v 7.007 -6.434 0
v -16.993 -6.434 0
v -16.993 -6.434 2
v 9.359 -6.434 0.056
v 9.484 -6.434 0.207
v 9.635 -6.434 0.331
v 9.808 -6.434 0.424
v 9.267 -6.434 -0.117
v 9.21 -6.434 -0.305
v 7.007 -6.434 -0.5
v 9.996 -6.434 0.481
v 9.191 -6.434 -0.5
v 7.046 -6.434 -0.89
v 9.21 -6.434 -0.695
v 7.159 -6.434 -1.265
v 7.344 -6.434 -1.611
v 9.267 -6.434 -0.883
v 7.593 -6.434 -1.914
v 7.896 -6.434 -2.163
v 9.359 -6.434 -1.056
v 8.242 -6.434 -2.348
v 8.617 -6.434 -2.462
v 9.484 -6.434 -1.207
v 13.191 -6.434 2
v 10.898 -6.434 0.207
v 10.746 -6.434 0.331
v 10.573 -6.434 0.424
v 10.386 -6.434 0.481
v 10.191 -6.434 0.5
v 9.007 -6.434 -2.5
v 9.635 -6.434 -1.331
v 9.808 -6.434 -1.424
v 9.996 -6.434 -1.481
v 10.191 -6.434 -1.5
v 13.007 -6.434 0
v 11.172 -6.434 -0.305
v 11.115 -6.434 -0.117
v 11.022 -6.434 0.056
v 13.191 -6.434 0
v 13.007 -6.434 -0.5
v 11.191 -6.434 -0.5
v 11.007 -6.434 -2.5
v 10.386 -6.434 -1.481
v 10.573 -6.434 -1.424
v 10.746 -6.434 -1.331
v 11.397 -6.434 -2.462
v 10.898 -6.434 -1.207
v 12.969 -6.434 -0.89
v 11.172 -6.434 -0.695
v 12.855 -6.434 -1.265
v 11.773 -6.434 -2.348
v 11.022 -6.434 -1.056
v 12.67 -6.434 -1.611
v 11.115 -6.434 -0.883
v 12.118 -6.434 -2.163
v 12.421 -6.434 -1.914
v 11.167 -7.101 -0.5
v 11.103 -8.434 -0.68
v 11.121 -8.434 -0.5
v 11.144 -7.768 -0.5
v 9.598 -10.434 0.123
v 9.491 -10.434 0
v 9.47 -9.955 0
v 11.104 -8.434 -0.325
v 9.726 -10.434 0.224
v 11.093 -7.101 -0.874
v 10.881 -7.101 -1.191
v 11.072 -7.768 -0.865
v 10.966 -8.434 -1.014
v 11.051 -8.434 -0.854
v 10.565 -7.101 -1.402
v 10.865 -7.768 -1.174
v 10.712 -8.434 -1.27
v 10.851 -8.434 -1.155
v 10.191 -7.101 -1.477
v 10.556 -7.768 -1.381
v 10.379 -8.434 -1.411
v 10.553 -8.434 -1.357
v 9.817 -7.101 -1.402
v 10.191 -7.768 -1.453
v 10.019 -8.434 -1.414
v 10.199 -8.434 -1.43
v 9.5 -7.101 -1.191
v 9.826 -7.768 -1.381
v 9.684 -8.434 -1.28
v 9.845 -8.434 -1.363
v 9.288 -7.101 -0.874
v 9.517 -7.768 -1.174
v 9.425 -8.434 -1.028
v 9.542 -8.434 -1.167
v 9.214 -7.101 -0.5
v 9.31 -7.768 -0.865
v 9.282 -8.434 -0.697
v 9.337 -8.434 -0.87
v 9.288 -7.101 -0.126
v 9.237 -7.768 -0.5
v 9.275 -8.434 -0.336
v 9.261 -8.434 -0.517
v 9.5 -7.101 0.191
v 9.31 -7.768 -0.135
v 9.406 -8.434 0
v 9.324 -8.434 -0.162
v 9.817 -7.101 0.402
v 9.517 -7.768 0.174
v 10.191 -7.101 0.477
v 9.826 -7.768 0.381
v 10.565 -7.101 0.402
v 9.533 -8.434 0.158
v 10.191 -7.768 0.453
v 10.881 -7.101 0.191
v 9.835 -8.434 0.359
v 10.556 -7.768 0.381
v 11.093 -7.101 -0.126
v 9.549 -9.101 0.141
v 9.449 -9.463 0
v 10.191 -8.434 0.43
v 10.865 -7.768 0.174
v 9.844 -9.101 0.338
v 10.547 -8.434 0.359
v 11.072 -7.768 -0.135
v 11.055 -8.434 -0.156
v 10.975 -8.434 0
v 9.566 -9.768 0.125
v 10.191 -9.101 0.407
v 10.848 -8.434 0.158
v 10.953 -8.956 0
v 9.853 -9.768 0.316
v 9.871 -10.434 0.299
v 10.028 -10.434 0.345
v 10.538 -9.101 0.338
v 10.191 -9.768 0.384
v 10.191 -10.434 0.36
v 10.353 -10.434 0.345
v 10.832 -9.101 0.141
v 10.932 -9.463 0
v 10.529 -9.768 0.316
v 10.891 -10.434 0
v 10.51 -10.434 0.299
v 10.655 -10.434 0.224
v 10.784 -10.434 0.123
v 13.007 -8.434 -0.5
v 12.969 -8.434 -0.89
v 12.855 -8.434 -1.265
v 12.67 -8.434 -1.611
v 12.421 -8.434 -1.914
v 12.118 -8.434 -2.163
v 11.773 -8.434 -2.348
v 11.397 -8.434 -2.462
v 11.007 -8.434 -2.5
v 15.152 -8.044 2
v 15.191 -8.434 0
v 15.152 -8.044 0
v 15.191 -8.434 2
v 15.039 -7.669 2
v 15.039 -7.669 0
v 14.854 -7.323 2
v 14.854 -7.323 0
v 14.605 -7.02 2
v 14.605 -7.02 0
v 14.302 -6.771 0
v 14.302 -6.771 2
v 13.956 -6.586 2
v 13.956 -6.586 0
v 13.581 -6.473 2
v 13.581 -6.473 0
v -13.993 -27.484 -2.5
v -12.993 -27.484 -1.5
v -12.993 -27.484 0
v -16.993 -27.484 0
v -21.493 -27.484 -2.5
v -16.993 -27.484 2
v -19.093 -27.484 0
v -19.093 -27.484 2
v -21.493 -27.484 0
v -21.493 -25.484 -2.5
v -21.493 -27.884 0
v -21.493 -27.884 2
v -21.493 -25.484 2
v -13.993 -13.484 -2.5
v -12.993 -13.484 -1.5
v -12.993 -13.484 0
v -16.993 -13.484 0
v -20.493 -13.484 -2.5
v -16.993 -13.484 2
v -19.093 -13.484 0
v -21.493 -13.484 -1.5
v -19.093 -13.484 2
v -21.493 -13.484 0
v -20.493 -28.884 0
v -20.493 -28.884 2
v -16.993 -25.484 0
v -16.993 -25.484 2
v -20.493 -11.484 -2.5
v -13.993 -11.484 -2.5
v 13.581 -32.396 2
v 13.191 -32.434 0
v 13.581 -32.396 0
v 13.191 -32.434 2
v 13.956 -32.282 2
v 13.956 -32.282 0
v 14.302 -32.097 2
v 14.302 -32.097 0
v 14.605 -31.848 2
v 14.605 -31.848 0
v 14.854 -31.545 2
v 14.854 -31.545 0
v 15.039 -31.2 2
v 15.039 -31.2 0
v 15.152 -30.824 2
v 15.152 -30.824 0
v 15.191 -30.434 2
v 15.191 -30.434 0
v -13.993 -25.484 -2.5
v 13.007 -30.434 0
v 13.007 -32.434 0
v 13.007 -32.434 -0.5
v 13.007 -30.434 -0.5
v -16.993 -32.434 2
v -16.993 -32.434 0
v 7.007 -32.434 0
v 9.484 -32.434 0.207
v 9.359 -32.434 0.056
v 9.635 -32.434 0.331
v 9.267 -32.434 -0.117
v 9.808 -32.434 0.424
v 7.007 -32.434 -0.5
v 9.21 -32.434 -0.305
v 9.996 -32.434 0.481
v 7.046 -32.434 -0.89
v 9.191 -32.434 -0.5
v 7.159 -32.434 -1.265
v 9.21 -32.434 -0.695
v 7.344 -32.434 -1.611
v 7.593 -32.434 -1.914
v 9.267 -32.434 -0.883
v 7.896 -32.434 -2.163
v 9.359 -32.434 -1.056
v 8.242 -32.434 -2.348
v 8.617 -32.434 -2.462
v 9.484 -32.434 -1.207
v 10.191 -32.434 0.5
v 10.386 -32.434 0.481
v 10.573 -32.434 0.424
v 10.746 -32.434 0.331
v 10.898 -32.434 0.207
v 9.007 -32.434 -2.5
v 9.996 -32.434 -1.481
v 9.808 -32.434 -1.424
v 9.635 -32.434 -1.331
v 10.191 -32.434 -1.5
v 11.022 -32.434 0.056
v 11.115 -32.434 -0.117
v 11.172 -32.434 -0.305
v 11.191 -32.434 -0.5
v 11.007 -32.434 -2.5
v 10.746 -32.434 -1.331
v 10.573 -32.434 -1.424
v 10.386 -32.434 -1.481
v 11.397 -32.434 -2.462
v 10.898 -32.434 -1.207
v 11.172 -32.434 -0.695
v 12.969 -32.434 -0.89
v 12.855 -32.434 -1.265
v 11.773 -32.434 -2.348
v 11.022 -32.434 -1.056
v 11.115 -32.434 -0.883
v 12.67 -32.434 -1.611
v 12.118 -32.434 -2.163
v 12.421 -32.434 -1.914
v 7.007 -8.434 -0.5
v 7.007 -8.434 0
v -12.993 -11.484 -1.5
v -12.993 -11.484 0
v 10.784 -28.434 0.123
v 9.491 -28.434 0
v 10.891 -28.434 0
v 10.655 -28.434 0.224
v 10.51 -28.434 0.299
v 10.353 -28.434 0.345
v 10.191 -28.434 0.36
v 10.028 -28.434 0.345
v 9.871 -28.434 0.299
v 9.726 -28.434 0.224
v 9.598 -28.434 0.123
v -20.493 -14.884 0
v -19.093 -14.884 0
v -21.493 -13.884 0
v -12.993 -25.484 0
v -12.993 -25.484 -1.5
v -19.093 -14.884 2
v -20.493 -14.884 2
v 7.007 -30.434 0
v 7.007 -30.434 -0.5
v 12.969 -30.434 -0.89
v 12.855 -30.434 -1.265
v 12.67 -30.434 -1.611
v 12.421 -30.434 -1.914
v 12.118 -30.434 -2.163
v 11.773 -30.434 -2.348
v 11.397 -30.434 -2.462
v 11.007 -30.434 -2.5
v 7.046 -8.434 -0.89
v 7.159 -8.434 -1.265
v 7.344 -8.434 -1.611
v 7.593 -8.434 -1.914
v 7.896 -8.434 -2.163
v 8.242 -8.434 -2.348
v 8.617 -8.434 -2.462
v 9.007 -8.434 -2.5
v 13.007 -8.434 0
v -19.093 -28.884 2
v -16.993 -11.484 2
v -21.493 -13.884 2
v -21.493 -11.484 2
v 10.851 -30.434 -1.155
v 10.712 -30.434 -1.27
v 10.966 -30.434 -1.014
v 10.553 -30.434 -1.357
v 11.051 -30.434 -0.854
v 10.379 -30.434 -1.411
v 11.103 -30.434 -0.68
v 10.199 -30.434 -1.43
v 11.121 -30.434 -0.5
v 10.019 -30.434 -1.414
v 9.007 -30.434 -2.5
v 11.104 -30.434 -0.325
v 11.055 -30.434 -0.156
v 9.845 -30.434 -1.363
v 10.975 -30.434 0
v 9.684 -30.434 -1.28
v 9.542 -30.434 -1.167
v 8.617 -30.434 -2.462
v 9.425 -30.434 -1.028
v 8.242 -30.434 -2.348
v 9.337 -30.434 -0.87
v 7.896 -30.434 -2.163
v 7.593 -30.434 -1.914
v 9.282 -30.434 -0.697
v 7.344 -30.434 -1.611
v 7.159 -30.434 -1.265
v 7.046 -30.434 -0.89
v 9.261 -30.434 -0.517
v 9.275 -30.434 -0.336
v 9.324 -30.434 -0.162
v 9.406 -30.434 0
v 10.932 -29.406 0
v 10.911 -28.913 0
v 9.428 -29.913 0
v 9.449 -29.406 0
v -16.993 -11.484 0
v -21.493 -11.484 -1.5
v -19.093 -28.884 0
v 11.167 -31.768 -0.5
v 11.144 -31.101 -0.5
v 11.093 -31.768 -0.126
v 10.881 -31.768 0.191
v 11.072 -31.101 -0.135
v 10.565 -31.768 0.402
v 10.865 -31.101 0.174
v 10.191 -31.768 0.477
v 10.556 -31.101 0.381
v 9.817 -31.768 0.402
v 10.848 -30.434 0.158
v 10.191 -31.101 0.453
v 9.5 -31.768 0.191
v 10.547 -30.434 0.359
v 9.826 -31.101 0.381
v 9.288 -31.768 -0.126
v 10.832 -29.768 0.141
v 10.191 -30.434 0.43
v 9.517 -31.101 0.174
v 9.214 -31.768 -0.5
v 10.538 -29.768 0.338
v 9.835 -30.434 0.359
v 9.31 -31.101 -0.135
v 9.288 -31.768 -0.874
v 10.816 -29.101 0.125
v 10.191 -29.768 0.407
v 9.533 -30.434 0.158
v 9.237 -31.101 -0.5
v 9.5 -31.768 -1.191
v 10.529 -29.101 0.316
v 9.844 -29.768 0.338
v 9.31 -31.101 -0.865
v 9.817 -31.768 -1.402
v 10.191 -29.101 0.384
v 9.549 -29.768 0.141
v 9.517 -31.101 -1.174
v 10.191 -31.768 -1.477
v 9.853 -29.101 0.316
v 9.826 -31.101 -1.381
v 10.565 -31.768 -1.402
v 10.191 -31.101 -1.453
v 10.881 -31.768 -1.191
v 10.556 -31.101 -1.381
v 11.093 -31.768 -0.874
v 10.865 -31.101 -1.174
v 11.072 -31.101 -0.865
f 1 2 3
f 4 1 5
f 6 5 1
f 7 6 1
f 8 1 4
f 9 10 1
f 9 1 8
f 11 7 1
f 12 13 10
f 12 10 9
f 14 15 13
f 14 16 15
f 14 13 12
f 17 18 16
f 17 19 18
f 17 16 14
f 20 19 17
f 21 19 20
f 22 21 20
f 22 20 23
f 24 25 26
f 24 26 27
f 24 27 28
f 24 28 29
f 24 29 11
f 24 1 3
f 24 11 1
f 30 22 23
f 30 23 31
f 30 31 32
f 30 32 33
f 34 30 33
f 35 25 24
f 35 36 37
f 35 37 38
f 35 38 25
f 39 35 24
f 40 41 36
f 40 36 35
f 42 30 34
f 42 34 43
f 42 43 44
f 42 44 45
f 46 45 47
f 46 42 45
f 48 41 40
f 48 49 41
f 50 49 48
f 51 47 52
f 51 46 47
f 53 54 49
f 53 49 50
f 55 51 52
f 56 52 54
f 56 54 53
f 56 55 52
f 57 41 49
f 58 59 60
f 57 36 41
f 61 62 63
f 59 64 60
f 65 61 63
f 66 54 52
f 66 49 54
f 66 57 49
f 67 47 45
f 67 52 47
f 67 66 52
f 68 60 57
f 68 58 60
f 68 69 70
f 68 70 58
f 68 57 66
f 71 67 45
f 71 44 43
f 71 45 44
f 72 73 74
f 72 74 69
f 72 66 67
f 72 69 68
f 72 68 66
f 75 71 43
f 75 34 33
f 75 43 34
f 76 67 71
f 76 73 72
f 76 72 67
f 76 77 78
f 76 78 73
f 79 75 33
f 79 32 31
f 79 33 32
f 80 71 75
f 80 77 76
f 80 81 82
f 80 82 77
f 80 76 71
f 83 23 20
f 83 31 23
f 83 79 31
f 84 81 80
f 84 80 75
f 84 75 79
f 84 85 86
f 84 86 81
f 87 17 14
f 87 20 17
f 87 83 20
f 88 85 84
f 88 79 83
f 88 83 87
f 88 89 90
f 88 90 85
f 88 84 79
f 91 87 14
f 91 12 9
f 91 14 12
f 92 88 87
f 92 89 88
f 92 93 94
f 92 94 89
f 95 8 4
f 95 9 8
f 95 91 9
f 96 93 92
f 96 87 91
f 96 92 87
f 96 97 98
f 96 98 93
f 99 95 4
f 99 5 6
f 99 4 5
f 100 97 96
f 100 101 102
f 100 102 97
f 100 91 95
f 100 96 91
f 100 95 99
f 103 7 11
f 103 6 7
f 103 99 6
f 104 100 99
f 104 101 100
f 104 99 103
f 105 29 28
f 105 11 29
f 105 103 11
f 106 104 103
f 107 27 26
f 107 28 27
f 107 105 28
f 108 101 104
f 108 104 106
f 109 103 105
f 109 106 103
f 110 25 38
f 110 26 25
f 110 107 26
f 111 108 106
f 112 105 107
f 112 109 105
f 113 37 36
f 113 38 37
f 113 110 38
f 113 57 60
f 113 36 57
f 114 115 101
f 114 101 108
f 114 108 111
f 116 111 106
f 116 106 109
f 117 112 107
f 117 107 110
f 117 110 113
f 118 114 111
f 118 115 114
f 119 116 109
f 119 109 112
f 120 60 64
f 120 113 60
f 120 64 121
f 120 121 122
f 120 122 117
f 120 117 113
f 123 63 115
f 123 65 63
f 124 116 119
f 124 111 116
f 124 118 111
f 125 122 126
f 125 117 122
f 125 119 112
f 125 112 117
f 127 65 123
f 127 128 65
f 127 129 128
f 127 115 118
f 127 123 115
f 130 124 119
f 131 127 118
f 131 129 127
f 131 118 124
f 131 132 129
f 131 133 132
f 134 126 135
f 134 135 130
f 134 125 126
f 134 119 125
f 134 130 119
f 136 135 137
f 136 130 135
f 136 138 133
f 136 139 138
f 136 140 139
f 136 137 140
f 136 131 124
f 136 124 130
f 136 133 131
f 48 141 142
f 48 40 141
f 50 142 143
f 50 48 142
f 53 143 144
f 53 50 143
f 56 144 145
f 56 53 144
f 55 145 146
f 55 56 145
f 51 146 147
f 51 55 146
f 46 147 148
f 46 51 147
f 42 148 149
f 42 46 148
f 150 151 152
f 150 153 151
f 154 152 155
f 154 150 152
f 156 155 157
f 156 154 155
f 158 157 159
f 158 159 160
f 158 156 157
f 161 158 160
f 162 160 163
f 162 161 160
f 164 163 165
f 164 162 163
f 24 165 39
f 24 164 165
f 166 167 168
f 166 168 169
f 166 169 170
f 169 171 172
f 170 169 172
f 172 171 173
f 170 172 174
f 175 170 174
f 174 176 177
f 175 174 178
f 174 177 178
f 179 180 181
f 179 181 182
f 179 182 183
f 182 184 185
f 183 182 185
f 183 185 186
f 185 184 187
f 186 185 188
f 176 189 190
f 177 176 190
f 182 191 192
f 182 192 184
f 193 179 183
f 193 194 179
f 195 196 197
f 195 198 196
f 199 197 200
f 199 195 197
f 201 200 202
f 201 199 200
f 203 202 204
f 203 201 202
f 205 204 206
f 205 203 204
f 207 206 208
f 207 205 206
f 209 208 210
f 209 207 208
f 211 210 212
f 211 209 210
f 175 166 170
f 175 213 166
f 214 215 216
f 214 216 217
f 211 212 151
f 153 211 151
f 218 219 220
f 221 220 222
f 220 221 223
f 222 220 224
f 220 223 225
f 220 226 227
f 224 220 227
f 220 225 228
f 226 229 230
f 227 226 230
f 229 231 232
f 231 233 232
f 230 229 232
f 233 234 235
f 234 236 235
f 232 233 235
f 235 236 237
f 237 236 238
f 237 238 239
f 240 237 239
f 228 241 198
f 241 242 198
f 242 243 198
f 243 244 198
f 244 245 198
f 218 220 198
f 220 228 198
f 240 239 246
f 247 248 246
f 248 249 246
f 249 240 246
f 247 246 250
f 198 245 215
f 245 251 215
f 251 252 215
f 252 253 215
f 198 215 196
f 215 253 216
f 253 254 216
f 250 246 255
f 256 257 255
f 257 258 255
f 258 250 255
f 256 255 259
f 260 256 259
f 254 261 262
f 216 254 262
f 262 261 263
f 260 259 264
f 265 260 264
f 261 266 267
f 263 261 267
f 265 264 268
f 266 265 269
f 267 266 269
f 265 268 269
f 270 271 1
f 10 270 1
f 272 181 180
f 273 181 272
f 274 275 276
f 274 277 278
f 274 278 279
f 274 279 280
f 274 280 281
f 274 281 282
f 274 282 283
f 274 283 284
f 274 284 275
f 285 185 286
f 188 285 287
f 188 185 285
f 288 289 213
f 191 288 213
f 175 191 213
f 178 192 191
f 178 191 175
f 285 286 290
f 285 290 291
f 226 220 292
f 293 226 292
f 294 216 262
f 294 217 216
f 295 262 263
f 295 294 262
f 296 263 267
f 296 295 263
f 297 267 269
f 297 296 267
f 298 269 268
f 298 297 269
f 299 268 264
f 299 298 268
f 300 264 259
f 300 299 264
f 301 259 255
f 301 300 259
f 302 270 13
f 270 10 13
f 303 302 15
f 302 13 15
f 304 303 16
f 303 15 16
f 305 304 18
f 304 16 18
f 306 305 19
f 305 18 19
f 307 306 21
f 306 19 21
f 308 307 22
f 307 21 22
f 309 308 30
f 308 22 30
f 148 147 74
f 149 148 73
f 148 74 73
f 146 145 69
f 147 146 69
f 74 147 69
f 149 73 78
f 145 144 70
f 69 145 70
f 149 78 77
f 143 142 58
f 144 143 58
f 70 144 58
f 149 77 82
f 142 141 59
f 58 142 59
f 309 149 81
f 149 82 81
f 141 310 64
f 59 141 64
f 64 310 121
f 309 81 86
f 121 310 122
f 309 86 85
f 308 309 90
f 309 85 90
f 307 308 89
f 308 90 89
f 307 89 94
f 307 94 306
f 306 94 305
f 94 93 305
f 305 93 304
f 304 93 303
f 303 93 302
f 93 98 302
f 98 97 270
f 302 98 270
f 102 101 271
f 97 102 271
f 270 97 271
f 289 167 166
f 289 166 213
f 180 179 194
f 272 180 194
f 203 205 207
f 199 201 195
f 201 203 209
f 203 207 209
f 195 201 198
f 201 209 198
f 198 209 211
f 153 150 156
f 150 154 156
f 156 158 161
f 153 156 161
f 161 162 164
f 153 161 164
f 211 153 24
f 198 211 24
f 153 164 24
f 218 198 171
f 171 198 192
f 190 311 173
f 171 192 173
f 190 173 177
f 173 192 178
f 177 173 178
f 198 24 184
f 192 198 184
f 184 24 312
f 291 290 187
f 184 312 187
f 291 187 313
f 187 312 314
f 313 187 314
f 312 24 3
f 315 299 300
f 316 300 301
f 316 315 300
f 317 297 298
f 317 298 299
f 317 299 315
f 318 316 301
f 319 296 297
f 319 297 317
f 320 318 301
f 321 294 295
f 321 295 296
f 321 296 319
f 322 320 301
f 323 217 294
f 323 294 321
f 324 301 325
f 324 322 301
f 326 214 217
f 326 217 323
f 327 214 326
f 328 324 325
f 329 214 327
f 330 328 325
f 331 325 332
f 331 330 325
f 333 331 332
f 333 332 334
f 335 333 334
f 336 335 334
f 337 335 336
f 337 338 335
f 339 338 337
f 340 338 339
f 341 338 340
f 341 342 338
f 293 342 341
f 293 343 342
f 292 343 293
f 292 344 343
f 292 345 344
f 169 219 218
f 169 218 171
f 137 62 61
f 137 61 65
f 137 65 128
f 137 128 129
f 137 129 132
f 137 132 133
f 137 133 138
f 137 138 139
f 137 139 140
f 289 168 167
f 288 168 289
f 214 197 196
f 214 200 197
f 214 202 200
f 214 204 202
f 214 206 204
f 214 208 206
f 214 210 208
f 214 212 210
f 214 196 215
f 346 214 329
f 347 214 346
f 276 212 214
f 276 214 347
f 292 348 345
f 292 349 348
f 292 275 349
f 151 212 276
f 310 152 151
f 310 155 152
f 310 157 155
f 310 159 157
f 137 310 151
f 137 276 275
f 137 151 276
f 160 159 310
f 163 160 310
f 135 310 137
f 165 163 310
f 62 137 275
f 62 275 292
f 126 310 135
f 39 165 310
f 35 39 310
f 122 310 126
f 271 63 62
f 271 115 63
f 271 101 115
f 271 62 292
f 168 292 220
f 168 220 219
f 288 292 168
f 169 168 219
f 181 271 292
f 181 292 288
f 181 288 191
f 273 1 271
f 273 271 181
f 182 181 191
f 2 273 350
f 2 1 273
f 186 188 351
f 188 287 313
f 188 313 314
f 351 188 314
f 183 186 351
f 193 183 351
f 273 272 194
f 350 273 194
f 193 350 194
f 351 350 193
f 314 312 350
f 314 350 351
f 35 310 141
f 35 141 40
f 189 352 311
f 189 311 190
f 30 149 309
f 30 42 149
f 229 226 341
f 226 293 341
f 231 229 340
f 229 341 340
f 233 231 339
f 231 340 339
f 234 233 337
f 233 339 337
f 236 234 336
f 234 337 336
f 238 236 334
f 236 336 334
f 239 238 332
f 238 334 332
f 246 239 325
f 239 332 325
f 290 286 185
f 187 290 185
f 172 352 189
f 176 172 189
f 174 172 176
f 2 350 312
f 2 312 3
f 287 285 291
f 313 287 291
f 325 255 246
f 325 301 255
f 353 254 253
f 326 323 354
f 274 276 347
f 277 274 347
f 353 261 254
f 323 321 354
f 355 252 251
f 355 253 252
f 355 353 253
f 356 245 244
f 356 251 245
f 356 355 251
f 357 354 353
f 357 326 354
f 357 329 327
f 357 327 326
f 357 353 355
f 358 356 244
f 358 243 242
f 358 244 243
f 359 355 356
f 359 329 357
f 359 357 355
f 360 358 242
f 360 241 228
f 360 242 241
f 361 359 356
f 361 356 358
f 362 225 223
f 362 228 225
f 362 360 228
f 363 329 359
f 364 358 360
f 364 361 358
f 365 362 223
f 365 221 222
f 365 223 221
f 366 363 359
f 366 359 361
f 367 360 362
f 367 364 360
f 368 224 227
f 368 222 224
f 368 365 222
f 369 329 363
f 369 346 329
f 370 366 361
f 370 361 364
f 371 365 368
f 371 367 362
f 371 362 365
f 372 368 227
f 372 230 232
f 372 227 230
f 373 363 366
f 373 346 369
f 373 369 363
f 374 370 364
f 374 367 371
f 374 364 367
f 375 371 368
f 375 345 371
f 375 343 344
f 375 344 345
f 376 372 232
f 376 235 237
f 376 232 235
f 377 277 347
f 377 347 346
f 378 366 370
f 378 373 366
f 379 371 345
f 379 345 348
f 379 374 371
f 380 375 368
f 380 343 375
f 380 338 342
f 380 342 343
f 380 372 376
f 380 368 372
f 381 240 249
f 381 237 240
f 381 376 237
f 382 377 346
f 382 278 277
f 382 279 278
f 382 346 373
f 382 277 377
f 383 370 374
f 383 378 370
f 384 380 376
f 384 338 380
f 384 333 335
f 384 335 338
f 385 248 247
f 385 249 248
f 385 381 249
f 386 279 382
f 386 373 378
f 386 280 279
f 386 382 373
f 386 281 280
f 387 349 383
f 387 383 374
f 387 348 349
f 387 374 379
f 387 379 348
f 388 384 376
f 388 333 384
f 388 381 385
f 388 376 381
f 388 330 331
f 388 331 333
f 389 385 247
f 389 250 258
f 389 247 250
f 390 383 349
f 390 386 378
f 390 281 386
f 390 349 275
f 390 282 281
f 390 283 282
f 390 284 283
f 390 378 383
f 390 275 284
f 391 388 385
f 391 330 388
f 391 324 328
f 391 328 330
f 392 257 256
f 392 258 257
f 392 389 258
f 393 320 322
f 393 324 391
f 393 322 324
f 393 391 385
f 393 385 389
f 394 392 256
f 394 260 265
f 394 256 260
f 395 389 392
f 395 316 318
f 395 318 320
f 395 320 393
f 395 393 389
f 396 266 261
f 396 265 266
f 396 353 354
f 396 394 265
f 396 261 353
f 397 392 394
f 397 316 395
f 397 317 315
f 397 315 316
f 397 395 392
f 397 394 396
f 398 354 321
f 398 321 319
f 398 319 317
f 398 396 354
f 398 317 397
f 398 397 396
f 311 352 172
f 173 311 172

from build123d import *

# Parameters (mm, degrees)
SKETCH_2_W          = 32.183544672
SKETCH_2_H          = 26
EXTRUDE_1_DEPTH     = 2
FILLET_1_R          = 2
SKETCH_5_W          = 6
SKETCH_5_H          = 2
EXTRUDE_2_DEPTH     = 2.5
FILLET_2_R          = 2
SKETCH_6_R          = 1
CUT_EXTRUDE_3_DEPTH = 4
CUT_EXTRUDE_3_TAPER = 2
SKETCH_7_R          = 1
CUT_EXTRUDE_4_DEPTH = 4
CUT_EXTRUDE_4_TAPER = 2
SKETCH_9_W          = 4.5
SKETCH_9_H          = 2
EXTRUDE_3_DEPTH     = 2
SKETCH_10_W         = 2.4
SKETCH_10_H         = 1.4
EXTRUDE_4_DEPTH     = 2
CHAMFER_1_SIZE      = 1
SKETCH_11_W         = 8.5
SKETCH_11_H         = 2
EXTRUDE_5_DEPTH     = 2.5
CHAMFER_2_SIZE      = 1


with BuildPart() as part:
    # 草图2 → 凸台-拉伸1 (new body)
    with BuildSketch(Plane.XY):
        with Locations((-0.901029093, -19.434236018)):
            Rectangle(SKETCH_2_W, SKETCH_2_H)
    extrude(amount=EXTRUDE_1_DEPTH)

    # 圆角1
    fillet_1_edges = [part.edges().sort_by_distance(p)[0] for p in [
        (15.190743243, -32.434236018, 1),
        (15.190743243, -6.434236018, 1),
    ]]
    fillet(fillet_1_edges, radius=FILLET_1_R)

    # 草图5 → 凸台-拉伸2 (add)
    with BuildSketch(Plane(origin=(0, 0, 0), x_dir=(-1, 0, 0), z_dir=(0, 0, -1))):
        with Locations((-10.007198571, -7.434236018)):
            Rectangle(SKETCH_5_W, SKETCH_5_H)
        with Locations((-10.007198571, -31.434236018)):
            Rectangle(SKETCH_5_W, SKETCH_5_H)
    extrude(amount=EXTRUDE_2_DEPTH)

    # 圆角2
    fillet_2_edges = [part.edges().sort_by_distance(p)[0] for p in [
        (13.007198571, -7.434236018, -2.5),
        (7.007198571, -7.434236018, -2.5),
        (13.007198571, -31.434236018, -2.5),
        (7.007198571, -31.434236018, -2.5),
    ]]
    fillet(fillet_2_edges, radius=FILLET_2_R)

    # 草图6 → 切除-拉伸3 (cut)
    with BuildSketch(Plane.XZ.offset(32.434236018)):
        with Locations((10.190743244, -0.5)):
            Circle(SKETCH_6_R)
    extrude(amount=-CUT_EXTRUDE_3_DEPTH, taper=CUT_EXTRUDE_3_TAPER, mode=Mode.SUBTRACT)

    # 草图7 → 切除-拉伸4 (cut)
    with BuildSketch(Plane(origin=(0, -6.434236018, 0), x_dir=(1, 0, 0), z_dir=(0, 1, 0))):
        with Locations((10.190743243, 0.5)):
            Circle(SKETCH_7_R)
    extrude(amount=-CUT_EXTRUDE_4_DEPTH, taper=CUT_EXTRUDE_4_TAPER, mode=Mode.SUBTRACT)

    # 草图9 → 凸台-拉伸3 (add)
    with BuildSketch(Plane(origin=(0, 0, 0), x_dir=(-1, 0, 0), z_dir=(0, 0, -1))):
        with Locations((19.242801429, -12.484236018)):
            Rectangle(SKETCH_9_W, SKETCH_9_H)
        with Locations((19.242801429, -26.484236018)):
            Rectangle(SKETCH_9_W, SKETCH_9_H)
    extrude(amount=-EXTRUDE_3_DEPTH)

    # 草图10 → 凸台-拉伸4 (add)
    with BuildSketch(Plane(origin=(0, 0, 0), x_dir=(-1, 0, 0), z_dir=(0, 0, -1))):
        with Locations((20.292801429, -14.184236018)):
            Rectangle(SKETCH_10_W, SKETCH_10_H)
        with Locations((20.292801429, -28.184236018)):
            Rectangle(SKETCH_10_W, SKETCH_10_H)
    extrude(amount=-EXTRUDE_4_DEPTH)

    # 倒角1
    chamfer_1_edges = [part.edges().sort_by_distance(p)[0] for p in [
        (-21.492801429, -14.884236018, 1),
        (-21.492801429, -28.884236018, 1),
    ]]
    chamfer(chamfer_1_edges, length=CHAMFER_1_SIZE)

    # 草图11 → 凸台-拉伸5 (add)
    with BuildSketch(Plane(origin=(0, 0, 0), x_dir=(-1, 0, 0), z_dir=(0, 0, -1))):
        with Locations((17.242801429, -12.484236018)):
            Rectangle(SKETCH_11_W, SKETCH_11_H)
        with Locations((17.242801429, -26.484236018)):
            Rectangle(SKETCH_11_W, SKETCH_11_H)
    extrude(amount=EXTRUDE_5_DEPTH)

    # 倒角2
    chamfer_2_edges = [part.edges().sort_by_distance(p)[0] for p in [
        (-21.492801429, -12.484236018, -2.5),
        (-12.992801429, -12.484236018, -2.5),
        (-12.992801429, -26.484236018, -2.5),
    ]]
    chamfer(chamfer_2_edges, length=CHAMFER_2_SIZE)


solid = part.part
